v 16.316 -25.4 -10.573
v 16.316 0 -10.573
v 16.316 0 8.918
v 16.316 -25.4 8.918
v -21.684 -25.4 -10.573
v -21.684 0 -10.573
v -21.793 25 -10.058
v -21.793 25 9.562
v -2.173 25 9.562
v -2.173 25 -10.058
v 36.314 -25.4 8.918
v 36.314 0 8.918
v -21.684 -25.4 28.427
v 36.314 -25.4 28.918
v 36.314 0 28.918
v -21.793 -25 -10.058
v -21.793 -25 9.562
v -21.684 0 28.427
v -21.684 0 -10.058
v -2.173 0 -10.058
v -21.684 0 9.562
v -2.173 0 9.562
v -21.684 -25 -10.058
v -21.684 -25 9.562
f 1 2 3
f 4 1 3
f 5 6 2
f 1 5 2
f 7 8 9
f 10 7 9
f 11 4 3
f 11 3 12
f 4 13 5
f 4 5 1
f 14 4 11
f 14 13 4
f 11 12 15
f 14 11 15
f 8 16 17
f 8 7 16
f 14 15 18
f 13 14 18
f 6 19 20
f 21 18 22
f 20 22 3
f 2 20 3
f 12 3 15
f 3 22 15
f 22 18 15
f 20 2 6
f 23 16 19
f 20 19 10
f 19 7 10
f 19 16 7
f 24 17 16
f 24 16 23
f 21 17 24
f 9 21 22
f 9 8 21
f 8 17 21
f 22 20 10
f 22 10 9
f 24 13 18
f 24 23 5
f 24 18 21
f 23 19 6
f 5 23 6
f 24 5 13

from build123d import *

# Parameters (mm, degrees)
F1_DEPTH = 25.4
F2_W     = 19.62
F2_H     = 19.62
F3_DEPTH = 25
F4_DEPTH = 25


with BuildPart() as f1:
    # F0 (on Front) → F1 (new body)
    with BuildSketch(Plane.XZ):
        Polygon((36.31416, 28.91813), (-21.683757, 28.426622), (-21.683757, -10.573378), (16.316243, -10.573378), (16.316243, 8.91813), (36.31416, 8.91813), align=None)
    extrude(amount=F1_DEPTH)

    # F2 (on Front) → F3 (join)
    with BuildSketch(Plane.XZ):
        with Locations((-11.983198, -0.2484)):
            Rectangle(F2_W, F2_H)
    extrude(amount=-F3_DEPTH)

    # F2 (on Front) → F4 (join)
    with BuildSketch(Plane.XZ):
        with Locations((-11.983198, -0.2484)):
            Rectangle(F2_W, F2_H)
    extrude(amount=F4_DEPTH)


solid = f1.part
